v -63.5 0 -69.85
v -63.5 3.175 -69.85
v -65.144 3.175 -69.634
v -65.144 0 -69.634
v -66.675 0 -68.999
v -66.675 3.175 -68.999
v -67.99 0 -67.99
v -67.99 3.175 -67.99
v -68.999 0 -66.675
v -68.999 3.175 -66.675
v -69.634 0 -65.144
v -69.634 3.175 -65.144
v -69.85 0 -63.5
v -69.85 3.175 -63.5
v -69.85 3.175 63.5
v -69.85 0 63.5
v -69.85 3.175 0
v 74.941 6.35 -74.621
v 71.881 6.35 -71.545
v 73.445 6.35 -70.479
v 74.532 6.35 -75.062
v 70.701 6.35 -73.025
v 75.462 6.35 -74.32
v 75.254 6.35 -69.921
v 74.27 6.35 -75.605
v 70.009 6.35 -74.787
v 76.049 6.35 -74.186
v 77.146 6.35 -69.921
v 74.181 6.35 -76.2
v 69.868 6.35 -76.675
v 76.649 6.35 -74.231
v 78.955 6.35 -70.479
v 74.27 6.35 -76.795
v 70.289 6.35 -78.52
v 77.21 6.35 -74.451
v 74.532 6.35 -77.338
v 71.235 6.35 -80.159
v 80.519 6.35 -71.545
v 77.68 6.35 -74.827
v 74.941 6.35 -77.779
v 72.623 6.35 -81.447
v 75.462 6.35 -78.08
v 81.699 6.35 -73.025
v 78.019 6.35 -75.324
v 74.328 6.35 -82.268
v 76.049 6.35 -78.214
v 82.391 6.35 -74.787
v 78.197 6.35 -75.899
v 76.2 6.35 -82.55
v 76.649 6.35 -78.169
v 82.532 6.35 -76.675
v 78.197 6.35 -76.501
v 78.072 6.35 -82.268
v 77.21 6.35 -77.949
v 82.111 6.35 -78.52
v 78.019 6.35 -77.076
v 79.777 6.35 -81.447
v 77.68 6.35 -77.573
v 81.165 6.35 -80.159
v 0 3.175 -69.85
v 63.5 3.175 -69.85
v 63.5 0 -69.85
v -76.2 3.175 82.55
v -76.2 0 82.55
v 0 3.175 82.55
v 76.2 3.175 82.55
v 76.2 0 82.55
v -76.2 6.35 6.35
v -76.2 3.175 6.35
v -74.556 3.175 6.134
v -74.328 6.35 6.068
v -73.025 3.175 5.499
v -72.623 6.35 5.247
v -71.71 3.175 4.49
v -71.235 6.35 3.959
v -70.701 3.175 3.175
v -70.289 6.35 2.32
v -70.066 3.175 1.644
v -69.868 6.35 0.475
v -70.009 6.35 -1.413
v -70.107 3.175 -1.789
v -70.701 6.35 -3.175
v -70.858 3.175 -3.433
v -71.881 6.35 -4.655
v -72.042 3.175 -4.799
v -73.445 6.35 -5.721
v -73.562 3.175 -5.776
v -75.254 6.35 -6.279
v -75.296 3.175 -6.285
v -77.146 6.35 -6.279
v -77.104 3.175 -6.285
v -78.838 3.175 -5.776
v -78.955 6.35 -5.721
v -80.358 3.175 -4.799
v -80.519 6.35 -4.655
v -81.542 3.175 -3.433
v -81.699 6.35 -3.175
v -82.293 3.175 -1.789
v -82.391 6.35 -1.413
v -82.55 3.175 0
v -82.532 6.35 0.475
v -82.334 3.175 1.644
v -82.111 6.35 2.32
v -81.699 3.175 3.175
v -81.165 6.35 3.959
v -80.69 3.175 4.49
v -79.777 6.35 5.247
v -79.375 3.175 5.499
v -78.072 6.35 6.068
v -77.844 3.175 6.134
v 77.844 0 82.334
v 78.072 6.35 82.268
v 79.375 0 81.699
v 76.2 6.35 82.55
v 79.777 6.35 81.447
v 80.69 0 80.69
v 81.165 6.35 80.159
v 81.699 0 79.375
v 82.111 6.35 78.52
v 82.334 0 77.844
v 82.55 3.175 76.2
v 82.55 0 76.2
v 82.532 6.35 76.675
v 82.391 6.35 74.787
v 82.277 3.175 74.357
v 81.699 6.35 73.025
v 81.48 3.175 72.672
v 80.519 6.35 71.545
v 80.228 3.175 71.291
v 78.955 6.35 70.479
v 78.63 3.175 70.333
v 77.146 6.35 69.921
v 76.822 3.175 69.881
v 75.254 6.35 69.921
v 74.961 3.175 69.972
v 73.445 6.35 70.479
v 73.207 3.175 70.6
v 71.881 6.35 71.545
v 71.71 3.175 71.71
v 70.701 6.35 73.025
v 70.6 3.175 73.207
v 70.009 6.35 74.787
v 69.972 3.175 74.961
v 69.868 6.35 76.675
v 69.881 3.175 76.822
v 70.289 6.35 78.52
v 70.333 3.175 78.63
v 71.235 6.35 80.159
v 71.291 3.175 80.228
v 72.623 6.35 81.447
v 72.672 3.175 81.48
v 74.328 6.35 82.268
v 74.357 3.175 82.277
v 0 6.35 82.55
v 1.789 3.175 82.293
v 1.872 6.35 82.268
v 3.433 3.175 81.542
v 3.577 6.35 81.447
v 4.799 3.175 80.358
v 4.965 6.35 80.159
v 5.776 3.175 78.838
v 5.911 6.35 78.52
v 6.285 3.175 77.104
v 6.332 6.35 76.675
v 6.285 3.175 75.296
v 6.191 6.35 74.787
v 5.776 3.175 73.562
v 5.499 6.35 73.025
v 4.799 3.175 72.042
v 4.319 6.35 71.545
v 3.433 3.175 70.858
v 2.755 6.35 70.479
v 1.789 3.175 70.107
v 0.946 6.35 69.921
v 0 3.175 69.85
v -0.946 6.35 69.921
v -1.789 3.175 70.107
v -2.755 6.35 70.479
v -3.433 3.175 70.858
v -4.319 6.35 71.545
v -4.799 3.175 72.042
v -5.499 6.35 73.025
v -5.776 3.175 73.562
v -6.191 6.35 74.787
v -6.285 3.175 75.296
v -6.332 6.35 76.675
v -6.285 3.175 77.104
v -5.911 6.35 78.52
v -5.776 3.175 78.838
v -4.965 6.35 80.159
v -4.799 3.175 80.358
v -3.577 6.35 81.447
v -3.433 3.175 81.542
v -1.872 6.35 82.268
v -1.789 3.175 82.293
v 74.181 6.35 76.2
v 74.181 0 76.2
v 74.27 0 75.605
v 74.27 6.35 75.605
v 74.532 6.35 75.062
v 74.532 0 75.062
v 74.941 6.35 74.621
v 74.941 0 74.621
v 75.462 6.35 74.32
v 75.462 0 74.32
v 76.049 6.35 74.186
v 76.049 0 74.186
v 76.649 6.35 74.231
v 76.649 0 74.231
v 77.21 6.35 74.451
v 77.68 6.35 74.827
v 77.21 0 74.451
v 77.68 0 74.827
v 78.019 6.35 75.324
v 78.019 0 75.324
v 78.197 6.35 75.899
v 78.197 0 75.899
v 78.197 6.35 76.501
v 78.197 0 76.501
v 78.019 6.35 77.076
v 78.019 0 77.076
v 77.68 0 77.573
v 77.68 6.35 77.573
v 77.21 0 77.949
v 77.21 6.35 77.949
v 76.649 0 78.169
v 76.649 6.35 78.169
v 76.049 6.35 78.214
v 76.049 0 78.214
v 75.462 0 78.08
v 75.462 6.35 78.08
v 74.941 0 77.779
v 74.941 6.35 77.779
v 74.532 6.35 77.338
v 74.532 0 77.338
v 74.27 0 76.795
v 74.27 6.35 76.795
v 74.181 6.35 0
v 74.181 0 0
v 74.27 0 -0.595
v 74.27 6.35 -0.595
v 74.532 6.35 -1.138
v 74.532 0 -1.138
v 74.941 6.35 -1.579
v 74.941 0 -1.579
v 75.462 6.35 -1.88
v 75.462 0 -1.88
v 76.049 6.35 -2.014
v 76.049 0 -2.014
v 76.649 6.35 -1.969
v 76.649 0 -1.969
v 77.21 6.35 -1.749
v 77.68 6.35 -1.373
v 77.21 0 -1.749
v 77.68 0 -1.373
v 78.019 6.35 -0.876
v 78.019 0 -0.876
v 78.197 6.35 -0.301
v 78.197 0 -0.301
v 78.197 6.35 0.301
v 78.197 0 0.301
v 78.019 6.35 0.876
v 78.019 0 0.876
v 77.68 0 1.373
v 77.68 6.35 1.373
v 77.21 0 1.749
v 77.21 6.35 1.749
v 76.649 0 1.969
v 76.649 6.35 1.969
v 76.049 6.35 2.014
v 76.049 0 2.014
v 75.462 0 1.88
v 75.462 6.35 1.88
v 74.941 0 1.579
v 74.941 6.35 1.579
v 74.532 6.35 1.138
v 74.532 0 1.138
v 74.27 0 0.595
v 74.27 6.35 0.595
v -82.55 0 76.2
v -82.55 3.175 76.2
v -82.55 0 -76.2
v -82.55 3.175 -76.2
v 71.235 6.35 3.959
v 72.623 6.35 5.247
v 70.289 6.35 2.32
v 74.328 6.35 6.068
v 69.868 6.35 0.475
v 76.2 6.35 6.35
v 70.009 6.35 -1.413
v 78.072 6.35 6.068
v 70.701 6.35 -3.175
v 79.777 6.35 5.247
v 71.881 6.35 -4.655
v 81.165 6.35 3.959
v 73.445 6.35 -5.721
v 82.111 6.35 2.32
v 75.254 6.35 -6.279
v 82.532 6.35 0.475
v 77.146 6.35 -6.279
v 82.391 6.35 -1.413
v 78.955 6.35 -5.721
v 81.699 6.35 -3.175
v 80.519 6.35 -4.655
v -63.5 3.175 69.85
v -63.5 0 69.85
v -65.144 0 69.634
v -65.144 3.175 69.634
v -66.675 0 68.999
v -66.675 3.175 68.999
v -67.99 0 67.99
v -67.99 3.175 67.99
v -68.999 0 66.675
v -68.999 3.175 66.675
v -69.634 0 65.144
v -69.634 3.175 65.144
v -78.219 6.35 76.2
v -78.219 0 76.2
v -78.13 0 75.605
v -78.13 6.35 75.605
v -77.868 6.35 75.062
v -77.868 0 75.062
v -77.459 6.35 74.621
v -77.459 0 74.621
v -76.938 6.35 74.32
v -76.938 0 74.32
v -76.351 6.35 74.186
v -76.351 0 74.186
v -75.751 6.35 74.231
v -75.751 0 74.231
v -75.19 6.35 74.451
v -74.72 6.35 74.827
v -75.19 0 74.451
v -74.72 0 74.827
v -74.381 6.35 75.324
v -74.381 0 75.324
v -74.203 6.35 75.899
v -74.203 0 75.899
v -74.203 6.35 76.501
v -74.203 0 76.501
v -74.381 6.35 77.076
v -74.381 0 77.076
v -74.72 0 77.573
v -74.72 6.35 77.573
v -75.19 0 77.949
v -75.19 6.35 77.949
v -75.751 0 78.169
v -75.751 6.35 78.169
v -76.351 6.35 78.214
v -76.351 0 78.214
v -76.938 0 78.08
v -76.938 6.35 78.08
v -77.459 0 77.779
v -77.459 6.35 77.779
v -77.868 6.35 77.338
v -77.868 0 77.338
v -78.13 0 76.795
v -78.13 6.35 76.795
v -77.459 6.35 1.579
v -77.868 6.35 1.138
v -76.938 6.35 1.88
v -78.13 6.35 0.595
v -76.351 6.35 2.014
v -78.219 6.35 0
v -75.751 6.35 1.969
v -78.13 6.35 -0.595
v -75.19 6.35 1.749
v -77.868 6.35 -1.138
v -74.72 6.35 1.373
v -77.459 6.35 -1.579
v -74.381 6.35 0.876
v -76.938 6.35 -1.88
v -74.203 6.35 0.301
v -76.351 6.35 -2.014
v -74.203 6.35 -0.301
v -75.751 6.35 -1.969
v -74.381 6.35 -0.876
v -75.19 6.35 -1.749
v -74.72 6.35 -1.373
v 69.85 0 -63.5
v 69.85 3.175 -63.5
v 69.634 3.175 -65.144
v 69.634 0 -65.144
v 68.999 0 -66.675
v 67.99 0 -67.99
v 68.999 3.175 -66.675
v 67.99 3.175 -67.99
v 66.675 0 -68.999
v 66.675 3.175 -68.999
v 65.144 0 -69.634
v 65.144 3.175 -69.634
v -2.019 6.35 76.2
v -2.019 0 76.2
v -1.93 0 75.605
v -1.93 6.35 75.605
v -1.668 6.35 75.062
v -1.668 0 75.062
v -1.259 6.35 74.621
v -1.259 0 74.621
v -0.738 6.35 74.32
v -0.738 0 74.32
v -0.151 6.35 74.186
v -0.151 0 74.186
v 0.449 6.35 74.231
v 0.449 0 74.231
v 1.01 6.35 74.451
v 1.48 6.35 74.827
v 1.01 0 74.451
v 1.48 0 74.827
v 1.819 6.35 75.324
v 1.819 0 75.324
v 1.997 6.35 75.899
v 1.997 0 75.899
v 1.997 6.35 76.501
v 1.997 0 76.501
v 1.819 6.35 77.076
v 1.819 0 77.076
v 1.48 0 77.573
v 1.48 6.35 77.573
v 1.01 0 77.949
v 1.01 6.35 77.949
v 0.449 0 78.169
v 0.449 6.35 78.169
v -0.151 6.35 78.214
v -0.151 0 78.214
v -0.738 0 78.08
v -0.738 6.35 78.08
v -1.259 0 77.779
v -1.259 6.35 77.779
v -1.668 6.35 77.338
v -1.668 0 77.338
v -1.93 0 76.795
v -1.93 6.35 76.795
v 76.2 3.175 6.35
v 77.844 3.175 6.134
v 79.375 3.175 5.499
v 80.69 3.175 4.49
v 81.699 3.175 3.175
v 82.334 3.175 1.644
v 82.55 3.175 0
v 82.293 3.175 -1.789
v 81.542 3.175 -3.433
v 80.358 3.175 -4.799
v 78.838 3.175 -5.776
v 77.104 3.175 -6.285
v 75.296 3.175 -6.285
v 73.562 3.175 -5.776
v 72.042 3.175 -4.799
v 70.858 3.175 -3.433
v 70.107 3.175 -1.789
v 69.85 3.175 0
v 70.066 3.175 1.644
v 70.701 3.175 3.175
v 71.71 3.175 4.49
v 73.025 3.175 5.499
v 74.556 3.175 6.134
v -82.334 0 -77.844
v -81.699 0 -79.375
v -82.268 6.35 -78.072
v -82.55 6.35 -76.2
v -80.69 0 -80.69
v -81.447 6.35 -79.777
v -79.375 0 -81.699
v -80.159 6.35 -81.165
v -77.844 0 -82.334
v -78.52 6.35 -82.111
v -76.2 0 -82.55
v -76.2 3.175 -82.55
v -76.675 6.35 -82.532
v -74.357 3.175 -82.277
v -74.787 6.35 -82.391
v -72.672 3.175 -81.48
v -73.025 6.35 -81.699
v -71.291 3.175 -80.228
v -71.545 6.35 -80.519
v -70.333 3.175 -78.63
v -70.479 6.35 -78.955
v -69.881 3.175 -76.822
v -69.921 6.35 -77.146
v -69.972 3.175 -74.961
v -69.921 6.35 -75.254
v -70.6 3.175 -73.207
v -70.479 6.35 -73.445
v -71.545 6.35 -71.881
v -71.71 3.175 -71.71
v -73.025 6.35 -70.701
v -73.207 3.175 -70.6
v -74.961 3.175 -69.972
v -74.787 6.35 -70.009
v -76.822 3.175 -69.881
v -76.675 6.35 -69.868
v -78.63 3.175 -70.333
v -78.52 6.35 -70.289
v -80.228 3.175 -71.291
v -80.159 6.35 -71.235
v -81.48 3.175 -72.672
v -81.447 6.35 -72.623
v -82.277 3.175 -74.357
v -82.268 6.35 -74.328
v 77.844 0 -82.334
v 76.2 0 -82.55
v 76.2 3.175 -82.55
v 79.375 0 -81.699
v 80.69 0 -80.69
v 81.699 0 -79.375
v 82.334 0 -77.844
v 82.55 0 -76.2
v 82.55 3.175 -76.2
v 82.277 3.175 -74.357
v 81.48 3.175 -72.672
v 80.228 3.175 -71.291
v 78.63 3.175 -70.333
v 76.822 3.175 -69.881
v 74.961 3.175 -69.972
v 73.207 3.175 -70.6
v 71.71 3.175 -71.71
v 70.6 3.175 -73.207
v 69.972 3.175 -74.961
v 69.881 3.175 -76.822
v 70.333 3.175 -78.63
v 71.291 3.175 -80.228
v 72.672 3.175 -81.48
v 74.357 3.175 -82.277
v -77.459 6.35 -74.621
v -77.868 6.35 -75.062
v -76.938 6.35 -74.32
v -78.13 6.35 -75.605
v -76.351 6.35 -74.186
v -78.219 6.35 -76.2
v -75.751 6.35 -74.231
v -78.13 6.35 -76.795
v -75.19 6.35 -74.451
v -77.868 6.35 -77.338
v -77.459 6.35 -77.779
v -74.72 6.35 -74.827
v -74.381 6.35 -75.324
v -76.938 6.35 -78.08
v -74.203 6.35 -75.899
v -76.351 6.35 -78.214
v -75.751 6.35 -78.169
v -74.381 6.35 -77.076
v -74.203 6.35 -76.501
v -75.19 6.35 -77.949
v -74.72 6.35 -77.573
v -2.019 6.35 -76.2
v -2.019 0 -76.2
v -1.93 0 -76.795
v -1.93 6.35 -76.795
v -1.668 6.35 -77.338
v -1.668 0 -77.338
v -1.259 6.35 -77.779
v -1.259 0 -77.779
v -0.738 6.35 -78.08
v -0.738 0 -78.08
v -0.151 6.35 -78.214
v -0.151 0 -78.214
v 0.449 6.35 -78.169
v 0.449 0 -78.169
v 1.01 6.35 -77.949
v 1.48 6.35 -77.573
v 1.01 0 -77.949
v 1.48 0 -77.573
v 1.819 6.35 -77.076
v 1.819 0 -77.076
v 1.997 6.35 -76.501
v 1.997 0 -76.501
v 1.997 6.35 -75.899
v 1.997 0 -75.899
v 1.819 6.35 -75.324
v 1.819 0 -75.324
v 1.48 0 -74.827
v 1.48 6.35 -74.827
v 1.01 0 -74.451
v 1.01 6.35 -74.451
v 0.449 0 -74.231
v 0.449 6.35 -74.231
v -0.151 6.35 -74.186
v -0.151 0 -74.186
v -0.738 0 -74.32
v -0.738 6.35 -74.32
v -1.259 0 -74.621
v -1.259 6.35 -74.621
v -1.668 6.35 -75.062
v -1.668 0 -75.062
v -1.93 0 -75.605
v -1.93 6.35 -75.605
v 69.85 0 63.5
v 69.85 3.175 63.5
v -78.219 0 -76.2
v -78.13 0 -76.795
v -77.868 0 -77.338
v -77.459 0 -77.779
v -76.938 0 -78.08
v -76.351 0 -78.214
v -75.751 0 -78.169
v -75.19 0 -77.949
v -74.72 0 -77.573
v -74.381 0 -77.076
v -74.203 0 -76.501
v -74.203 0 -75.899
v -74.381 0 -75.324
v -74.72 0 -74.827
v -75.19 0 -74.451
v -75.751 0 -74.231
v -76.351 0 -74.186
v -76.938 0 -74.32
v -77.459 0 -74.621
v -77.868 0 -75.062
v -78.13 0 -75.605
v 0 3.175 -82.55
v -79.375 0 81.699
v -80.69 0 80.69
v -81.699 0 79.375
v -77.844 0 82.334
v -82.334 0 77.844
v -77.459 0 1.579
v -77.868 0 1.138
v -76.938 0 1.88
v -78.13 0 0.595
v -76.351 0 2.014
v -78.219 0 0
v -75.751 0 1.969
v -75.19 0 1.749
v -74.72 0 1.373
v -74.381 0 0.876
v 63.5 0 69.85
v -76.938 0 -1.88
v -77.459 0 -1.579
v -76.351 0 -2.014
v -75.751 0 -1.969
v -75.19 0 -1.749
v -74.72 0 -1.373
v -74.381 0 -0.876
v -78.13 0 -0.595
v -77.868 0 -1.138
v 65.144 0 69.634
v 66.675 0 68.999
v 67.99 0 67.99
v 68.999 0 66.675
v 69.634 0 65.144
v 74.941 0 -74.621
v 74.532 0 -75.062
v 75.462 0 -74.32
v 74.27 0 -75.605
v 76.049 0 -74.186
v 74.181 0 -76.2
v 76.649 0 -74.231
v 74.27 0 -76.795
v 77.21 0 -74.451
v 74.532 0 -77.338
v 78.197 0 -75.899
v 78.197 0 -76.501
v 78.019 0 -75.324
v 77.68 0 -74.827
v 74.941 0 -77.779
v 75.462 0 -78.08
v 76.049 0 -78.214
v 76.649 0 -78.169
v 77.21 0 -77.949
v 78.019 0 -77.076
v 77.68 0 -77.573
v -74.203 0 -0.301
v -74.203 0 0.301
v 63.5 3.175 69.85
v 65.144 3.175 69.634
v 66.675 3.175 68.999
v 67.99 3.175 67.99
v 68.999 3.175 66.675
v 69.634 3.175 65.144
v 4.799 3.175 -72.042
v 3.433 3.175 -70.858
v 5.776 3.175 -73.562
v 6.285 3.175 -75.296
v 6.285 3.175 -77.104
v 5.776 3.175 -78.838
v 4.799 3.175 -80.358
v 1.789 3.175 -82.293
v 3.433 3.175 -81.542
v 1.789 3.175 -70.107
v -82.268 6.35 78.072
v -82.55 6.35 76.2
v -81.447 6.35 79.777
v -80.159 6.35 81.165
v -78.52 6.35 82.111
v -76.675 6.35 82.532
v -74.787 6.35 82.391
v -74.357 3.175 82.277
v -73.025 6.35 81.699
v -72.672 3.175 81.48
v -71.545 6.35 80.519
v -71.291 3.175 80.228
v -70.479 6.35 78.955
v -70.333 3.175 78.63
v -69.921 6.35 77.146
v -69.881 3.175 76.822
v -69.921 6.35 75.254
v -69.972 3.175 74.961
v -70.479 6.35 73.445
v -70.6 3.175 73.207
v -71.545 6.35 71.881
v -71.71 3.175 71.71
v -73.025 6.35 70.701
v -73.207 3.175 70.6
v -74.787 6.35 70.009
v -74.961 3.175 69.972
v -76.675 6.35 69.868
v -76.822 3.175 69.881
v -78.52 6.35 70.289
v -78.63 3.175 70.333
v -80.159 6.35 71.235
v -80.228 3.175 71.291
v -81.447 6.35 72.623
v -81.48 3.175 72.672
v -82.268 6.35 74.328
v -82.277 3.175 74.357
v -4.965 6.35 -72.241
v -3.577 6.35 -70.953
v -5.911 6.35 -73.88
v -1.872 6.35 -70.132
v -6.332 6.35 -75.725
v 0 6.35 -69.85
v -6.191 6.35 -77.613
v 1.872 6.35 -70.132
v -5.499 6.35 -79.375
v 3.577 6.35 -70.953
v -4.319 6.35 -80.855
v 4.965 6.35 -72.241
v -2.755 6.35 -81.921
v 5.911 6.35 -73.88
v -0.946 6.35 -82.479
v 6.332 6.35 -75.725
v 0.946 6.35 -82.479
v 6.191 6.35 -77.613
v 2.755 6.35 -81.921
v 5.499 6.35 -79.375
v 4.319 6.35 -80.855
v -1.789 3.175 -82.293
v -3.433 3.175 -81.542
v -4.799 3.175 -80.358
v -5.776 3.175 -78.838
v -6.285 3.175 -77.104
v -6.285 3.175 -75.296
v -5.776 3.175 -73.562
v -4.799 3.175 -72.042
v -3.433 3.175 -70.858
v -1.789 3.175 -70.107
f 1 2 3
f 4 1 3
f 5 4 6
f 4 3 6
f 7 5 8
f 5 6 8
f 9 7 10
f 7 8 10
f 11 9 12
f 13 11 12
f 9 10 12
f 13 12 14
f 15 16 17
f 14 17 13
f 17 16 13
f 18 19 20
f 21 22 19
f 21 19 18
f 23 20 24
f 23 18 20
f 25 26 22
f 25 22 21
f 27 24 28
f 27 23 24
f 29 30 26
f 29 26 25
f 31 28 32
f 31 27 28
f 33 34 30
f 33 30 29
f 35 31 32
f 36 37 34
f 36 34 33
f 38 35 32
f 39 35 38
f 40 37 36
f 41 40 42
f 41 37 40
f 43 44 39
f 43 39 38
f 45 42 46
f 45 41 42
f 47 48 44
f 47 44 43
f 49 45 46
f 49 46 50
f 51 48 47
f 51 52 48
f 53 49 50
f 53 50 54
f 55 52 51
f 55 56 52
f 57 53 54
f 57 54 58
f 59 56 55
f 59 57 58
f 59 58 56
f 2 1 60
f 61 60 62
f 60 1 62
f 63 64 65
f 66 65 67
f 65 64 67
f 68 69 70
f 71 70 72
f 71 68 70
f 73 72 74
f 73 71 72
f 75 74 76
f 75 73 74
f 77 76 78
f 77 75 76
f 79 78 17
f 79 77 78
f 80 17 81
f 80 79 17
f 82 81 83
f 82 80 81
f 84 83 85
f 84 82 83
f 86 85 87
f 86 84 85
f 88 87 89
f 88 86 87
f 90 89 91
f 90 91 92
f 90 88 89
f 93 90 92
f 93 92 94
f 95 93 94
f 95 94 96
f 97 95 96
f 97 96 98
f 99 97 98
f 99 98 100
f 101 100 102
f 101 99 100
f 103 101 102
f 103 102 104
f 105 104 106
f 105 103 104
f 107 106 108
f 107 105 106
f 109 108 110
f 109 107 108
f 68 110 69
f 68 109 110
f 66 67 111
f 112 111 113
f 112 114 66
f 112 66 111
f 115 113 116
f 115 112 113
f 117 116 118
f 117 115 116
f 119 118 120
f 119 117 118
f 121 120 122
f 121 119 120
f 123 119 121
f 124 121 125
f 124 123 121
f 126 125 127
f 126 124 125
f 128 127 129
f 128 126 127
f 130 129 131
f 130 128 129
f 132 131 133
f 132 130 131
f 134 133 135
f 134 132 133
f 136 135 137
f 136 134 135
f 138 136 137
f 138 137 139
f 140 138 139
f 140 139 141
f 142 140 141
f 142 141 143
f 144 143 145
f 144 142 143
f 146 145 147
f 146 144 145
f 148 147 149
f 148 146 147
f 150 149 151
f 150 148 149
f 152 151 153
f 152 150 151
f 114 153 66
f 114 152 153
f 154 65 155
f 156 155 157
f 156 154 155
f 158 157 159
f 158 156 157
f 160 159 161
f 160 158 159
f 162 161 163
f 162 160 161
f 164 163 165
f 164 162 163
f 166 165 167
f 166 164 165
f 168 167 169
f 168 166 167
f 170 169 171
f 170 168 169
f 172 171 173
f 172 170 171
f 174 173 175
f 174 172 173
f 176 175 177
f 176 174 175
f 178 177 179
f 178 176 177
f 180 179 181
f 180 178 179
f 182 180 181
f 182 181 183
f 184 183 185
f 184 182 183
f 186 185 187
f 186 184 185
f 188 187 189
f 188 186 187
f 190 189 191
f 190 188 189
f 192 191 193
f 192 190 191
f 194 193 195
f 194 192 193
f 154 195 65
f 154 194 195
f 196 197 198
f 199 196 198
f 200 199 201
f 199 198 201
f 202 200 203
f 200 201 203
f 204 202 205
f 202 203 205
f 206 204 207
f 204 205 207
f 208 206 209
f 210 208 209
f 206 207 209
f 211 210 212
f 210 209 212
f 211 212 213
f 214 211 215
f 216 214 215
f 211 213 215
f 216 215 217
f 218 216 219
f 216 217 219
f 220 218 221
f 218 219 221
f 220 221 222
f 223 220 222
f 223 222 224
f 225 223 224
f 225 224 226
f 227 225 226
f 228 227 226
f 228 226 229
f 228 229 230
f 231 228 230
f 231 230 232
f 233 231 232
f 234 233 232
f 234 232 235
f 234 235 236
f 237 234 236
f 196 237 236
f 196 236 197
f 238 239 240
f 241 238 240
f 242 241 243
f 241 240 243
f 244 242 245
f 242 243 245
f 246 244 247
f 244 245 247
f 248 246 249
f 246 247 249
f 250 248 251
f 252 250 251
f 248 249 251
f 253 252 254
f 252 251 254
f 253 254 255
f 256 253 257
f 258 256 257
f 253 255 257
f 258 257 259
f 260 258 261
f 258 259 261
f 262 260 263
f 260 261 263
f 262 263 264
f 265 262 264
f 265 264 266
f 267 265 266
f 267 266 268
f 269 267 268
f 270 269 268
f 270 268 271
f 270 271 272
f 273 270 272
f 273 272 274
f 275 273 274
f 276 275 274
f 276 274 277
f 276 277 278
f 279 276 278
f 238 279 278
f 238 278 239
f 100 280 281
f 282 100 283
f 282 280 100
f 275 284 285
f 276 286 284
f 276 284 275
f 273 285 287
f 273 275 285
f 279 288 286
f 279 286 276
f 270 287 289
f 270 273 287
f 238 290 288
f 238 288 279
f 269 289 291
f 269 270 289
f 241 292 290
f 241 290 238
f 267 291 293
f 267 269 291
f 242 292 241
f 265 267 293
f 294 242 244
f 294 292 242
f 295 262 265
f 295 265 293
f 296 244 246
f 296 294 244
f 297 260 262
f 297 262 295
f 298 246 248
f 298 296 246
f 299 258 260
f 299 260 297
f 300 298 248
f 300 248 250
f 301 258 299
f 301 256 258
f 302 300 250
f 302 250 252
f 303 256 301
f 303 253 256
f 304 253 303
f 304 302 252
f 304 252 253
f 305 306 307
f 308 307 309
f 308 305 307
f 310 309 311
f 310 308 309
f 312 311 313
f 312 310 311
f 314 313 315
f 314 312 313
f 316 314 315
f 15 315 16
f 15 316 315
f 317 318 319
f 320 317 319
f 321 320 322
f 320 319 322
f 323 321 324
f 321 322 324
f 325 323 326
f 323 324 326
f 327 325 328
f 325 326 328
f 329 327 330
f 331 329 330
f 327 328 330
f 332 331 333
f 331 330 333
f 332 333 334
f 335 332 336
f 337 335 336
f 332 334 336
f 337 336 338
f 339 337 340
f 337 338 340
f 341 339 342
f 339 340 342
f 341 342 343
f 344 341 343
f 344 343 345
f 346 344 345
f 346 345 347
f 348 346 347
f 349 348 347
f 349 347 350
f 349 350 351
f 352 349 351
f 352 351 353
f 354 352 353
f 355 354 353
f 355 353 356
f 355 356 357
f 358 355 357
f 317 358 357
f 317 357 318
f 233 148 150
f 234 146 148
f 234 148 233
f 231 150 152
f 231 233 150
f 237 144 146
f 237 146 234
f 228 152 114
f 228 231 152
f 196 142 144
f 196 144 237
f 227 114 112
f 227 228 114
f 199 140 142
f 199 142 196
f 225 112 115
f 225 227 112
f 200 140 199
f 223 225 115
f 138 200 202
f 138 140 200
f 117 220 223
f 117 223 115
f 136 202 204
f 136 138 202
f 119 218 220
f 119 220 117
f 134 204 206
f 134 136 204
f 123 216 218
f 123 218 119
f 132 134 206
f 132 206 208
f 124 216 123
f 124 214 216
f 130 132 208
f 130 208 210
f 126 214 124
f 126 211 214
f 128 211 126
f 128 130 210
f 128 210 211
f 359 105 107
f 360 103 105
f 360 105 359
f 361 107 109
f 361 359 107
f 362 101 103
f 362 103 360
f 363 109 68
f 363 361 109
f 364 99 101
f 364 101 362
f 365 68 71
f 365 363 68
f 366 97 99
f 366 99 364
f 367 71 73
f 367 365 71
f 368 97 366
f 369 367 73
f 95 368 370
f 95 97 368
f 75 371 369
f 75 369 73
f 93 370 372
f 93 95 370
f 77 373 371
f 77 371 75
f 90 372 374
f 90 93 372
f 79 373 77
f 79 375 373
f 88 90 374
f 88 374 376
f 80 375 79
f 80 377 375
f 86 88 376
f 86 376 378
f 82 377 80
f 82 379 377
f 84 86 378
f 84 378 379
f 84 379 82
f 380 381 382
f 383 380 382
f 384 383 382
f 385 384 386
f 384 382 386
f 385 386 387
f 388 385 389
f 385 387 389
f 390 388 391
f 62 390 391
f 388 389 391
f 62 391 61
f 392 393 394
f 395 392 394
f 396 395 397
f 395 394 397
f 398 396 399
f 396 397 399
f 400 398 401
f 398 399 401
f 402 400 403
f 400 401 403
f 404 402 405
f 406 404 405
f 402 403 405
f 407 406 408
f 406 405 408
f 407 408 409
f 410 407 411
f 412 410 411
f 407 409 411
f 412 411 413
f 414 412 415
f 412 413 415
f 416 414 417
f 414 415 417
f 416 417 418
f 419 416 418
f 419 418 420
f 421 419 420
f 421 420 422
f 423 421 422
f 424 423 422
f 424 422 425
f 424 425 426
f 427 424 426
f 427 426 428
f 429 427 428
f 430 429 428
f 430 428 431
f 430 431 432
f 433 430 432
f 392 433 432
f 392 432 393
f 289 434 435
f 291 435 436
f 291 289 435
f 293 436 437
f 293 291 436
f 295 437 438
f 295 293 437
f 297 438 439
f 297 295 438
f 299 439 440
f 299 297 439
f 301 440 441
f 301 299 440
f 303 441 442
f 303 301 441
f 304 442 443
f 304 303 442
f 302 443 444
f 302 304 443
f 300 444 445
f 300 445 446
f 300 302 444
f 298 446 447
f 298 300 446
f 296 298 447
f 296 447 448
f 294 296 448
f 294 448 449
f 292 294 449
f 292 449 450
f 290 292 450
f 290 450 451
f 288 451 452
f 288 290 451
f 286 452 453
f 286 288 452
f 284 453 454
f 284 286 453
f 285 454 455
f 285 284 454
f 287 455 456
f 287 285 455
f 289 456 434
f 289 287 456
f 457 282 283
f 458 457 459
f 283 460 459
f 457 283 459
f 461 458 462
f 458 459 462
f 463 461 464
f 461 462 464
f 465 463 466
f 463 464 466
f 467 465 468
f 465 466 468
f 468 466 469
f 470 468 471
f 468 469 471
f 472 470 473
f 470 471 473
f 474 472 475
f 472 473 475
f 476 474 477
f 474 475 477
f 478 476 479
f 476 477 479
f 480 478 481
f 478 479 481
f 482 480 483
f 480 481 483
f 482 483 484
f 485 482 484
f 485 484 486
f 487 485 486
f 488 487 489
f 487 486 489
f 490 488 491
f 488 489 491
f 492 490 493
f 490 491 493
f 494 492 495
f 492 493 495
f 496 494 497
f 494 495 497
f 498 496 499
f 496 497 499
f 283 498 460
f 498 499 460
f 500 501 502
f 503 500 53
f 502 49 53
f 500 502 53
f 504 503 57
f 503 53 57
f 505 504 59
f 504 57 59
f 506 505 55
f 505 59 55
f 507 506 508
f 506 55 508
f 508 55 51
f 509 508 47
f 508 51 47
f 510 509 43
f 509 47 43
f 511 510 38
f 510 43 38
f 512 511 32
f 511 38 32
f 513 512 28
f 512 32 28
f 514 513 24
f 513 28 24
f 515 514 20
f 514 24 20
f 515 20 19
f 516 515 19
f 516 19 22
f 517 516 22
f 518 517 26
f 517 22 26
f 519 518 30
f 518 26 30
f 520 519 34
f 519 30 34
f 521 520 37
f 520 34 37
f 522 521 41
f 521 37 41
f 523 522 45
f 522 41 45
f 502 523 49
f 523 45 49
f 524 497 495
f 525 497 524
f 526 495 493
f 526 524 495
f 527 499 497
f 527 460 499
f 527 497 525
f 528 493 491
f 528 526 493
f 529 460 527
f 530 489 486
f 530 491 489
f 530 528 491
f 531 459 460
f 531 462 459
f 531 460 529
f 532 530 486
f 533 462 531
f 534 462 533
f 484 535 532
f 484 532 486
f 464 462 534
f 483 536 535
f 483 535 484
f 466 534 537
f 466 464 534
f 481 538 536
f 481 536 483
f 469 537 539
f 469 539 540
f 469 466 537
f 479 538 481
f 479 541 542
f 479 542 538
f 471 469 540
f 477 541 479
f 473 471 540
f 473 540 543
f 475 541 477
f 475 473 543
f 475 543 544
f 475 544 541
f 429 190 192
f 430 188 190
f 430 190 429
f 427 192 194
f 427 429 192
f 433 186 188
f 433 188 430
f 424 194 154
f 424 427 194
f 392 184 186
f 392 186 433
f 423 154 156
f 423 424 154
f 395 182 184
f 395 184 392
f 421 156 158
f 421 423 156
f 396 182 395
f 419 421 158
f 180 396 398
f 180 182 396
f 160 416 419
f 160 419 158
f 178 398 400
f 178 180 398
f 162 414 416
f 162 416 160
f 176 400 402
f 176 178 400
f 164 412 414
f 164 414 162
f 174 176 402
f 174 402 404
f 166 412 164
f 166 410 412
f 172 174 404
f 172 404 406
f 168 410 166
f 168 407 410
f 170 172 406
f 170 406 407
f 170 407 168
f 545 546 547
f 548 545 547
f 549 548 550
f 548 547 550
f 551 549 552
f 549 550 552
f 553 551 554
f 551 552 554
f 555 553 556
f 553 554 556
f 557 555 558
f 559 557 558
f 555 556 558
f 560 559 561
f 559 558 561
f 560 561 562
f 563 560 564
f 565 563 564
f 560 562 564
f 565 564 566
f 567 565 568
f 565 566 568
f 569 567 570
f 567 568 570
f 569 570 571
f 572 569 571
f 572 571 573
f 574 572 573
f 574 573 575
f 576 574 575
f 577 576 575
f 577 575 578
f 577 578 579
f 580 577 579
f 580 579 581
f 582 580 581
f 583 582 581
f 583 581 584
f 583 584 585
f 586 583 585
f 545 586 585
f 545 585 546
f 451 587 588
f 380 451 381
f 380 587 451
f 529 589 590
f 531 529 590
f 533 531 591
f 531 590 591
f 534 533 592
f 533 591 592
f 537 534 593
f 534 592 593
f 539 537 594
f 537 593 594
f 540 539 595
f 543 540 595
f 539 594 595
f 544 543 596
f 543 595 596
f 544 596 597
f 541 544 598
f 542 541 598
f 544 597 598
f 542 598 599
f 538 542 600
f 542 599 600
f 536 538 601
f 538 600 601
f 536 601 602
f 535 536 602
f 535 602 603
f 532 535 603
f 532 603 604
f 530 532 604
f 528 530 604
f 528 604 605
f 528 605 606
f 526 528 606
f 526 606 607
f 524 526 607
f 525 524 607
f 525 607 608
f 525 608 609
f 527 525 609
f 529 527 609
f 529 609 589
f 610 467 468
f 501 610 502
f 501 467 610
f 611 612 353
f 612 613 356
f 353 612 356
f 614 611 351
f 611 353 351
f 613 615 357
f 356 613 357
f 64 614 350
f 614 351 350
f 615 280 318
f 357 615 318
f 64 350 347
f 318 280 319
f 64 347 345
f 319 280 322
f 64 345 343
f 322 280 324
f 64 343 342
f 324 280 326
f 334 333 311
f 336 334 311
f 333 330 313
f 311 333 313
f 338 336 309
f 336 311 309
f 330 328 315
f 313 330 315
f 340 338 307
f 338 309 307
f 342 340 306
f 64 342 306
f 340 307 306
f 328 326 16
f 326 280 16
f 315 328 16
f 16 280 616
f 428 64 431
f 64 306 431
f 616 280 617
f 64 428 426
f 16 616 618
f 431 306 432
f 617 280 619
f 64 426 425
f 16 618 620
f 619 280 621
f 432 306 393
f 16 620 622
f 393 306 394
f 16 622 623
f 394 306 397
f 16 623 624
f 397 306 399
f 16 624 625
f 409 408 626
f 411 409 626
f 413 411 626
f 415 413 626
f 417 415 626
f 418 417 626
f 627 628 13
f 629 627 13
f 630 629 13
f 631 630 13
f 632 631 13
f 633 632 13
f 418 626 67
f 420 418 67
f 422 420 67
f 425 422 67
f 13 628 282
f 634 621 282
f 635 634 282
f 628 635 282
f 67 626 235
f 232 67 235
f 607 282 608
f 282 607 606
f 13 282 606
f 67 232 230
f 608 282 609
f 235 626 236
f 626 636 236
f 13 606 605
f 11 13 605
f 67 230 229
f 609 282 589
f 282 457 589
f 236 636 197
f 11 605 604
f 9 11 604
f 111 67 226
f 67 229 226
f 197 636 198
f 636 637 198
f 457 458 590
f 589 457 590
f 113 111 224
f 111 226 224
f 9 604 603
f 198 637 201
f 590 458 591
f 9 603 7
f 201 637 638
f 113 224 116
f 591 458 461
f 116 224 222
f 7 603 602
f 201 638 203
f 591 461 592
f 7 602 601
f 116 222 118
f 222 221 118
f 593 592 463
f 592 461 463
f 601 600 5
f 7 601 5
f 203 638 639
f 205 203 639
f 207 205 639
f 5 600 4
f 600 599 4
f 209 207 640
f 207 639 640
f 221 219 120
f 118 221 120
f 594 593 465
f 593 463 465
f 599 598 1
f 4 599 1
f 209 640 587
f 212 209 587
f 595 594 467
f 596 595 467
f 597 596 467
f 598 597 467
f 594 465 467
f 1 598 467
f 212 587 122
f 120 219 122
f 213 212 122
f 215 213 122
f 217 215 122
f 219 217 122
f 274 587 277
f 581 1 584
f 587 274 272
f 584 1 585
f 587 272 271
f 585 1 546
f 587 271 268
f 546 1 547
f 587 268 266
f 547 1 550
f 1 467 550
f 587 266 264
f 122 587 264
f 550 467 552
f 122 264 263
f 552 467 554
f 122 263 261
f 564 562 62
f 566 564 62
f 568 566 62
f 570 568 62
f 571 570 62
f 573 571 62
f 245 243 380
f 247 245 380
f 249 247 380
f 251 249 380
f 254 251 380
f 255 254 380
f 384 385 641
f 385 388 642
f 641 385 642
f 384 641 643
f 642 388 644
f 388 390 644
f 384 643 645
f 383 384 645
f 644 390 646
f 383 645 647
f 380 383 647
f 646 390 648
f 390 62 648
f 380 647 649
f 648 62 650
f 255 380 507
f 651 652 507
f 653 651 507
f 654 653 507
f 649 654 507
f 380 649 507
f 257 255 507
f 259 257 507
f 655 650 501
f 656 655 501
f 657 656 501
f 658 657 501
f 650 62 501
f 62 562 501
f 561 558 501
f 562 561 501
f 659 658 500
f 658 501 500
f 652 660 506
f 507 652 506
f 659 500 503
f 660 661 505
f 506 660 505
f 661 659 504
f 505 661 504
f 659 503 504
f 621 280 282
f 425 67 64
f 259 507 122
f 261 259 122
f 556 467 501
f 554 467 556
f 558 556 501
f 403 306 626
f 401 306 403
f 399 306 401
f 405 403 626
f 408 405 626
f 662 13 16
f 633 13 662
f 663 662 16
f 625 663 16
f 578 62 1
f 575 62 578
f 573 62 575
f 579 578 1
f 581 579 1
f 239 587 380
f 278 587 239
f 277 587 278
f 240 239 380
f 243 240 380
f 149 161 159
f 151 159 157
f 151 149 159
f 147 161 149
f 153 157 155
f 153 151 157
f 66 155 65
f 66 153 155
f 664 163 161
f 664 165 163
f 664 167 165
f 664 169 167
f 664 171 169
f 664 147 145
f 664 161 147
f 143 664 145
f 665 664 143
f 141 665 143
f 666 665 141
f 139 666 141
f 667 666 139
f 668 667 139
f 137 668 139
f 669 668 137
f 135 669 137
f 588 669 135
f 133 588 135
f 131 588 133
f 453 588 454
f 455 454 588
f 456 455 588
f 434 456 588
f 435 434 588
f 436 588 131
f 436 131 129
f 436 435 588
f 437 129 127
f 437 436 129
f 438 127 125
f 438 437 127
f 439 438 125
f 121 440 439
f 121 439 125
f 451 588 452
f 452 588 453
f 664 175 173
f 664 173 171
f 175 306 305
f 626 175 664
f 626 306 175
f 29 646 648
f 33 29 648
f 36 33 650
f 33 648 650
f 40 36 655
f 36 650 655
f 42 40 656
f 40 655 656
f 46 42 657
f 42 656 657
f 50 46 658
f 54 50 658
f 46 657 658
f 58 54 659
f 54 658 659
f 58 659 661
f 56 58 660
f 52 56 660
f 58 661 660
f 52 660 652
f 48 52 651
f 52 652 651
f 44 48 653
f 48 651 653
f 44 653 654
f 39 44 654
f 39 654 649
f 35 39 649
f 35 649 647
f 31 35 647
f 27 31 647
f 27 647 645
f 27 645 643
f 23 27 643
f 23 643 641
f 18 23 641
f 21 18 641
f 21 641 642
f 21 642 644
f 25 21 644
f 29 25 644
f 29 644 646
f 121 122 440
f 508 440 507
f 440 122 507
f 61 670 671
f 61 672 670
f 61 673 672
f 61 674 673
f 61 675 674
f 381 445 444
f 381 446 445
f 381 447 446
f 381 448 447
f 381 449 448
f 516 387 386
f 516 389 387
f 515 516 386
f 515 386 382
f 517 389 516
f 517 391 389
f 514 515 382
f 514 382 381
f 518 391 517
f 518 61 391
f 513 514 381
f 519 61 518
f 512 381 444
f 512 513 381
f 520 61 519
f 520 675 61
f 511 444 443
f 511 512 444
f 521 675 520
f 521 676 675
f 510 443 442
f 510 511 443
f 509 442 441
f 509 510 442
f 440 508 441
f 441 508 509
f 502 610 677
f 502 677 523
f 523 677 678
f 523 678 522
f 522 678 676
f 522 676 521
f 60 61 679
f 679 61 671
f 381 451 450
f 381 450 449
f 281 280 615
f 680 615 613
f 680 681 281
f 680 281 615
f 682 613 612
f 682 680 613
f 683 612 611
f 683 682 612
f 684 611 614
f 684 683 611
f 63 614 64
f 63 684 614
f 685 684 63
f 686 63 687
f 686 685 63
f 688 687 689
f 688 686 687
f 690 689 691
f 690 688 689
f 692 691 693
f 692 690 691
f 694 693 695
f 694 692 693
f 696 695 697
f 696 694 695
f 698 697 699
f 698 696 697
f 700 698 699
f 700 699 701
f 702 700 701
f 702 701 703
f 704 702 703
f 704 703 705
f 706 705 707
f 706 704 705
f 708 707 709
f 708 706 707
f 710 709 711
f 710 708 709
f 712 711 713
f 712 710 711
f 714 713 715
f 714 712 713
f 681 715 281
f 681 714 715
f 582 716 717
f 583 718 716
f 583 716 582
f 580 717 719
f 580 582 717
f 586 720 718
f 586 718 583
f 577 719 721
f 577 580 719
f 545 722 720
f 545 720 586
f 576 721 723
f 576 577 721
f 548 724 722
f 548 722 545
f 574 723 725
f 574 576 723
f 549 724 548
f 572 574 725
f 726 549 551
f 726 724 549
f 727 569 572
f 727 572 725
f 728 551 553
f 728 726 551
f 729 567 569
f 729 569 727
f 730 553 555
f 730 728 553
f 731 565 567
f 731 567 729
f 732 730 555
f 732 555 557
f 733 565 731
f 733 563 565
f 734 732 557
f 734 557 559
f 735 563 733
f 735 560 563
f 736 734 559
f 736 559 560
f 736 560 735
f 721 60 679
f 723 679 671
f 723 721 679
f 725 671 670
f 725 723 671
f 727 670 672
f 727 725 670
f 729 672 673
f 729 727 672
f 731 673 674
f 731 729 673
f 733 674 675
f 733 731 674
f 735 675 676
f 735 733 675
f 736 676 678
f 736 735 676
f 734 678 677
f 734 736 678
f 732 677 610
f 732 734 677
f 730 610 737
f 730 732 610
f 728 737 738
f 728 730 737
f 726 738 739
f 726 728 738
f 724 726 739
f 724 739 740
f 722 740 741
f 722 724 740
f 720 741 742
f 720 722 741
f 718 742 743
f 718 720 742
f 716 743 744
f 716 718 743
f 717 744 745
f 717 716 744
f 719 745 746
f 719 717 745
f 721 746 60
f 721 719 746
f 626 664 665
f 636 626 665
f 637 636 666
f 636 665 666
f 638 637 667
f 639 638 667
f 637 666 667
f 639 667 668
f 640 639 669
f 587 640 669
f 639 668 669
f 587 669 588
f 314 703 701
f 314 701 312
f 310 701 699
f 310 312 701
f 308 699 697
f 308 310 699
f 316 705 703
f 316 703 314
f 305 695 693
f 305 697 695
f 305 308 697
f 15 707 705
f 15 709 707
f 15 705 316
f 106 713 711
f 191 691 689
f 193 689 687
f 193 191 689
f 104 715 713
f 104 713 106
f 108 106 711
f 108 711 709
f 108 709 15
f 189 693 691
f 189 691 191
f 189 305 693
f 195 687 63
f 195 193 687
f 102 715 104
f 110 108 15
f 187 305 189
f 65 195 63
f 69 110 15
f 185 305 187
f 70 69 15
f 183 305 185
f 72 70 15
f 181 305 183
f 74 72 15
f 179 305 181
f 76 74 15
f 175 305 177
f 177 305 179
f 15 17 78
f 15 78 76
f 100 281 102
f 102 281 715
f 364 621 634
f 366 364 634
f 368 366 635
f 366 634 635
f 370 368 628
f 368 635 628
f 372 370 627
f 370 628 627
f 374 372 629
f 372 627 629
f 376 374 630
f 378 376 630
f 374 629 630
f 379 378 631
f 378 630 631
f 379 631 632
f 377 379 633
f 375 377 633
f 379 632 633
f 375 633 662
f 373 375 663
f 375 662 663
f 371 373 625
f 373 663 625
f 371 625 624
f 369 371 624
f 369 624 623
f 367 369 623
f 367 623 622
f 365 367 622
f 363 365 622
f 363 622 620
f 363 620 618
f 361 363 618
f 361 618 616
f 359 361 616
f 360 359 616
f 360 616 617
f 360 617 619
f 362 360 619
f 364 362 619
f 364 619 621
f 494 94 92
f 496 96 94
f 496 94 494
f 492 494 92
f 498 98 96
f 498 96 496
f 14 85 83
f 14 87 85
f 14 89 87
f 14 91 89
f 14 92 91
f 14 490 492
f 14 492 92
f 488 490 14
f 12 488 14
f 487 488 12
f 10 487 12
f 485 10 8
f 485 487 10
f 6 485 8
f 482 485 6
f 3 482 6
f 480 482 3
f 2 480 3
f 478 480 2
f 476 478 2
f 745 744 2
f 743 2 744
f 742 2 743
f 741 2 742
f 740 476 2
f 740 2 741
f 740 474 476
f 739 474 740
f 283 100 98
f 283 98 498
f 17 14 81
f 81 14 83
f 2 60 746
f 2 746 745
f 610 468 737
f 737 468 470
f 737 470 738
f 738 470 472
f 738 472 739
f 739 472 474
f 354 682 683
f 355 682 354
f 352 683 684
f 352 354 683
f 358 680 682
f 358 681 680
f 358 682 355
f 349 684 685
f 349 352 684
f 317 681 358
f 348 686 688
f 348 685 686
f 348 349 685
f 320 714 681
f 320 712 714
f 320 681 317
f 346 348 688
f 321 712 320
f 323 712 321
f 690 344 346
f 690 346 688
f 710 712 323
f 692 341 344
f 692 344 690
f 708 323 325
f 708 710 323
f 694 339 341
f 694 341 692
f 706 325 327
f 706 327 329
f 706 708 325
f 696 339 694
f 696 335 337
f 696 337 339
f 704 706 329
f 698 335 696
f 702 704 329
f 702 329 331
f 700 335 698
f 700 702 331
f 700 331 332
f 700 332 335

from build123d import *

# Parameters (mm, degrees)
SKETCH1_W              = 165.1
SKETCH1_H              = 165.1
SKETCH1_W_2            = 139.7
SKETCH1_H_2            = 139.7
BOSS_EXTRUDE1_DEPTH    = 6.35
FILLET1_R              = 6.35
F_10_32_TAPPED_HOLE1_D = 4.0386
SKETCH4_OUTSIDE_W      = 213.814
SKETCH4_OUTSIDE_H      = 213.814
SKETCH4_OUTSIDE_R      = 6.35
CUT_EXTRUDE1_DEPTH     = 3.175


with BuildPart() as part:
    # Sketch1 → Boss-Extrude1 (new body)
    with BuildSketch(Plane(origin=(0, 0, 0), x_dir=(1, 0, 0), z_dir=(0, 1, 0))):
        Rectangle(SKETCH1_W, SKETCH1_H)
        Rectangle(SKETCH1_W_2, SKETCH1_H_2, mode=Mode.SUBTRACT)
    extrude(amount=BOSS_EXTRUDE1_DEPTH)

    # Fillet1
    fillet1_edges = [part.edges().sort_by_distance(p)[0] for p in [
        (-69.85, 3.175, -69.85),
        (-69.85, 3.175, 69.85),
        (69.85, 3.175, 69.85),
        (69.85, 3.175, -69.85),
        (-82.55, 3.175, -82.55),
        (82.55, 3.175, -82.55),
        (82.55, 3.175, 82.55),
        (-82.55, 3.175, 82.55),
    ]]
    fillet(fillet1_edges, radius=FILLET1_R)

    # #10-32 Tapped Hole1 (through all)
    with Locations(Plane(origin=(0, 6.35, 0), x_dir=(1, 0, 0), z_dir=(0, 1, 0))):
        with Locations((-76.2, -76.2), (-76.2, 76.2), (76.2, 76.2), (76.2, -76.2), (-76.2, 0), (0, 76.2), (76.2, 0), (0, -76.2)):
            Hole(F_10_32_TAPPED_HOLE1_D / 2)

    # Sketch4 outside → Cut-Extrude1 (cut)
    with BuildSketch(Plane(origin=(0, 6.35, 0), x_dir=(1, 0, 0), z_dir=(0, 1, 0))):
        Rectangle(SKETCH4_OUTSIDE_W, SKETCH4_OUTSIDE_H)
        with Locations(Location((-76.2, 76.2, 0), (0, 0, 90))):
            Circle(SKETCH4_OUTSIDE_R, mode=Mode.SUBTRACT)
        with Locations(Location((-76.2, 0, 0), (0, 0, 270))):
            Circle(SKETCH4_OUTSIDE_R, mode=Mode.SUBTRACT)
        with Locations(Location((-76.2, -76.2, 0), (0, 0, 270))):
            Circle(SKETCH4_OUTSIDE_R, mode=Mode.SUBTRACT)
        with Locations(Location((0, -76.2, 0), (0, 0, 270))):
            Circle(SKETCH4_OUTSIDE_R, mode=Mode.SUBTRACT)
        with Locations(Location((76.2, -76.2, 0), (0, 0, 270))):
            Circle(SKETCH4_OUTSIDE_R, mode=Mode.SUBTRACT)
        with Locations(Location((76.2, 0, 0), (0, 0, 270))):
            Circle(SKETCH4_OUTSIDE_R, mode=Mode.SUBTRACT)
        with Locations(Location((76.2, 76.2, 0), (0, 0, 90))):
            Circle(SKETCH4_OUTSIDE_R, mode=Mode.SUBTRACT)
        with Locations(Location((0, 76.2, 0), (0, 0, 270))):
            Circle(SKETCH4_OUTSIDE_R, mode=Mode.SUBTRACT)
    extrude(amount=-CUT_EXTRUDE1_DEPTH, mode=Mode.SUBTRACT)


solid = part.part
